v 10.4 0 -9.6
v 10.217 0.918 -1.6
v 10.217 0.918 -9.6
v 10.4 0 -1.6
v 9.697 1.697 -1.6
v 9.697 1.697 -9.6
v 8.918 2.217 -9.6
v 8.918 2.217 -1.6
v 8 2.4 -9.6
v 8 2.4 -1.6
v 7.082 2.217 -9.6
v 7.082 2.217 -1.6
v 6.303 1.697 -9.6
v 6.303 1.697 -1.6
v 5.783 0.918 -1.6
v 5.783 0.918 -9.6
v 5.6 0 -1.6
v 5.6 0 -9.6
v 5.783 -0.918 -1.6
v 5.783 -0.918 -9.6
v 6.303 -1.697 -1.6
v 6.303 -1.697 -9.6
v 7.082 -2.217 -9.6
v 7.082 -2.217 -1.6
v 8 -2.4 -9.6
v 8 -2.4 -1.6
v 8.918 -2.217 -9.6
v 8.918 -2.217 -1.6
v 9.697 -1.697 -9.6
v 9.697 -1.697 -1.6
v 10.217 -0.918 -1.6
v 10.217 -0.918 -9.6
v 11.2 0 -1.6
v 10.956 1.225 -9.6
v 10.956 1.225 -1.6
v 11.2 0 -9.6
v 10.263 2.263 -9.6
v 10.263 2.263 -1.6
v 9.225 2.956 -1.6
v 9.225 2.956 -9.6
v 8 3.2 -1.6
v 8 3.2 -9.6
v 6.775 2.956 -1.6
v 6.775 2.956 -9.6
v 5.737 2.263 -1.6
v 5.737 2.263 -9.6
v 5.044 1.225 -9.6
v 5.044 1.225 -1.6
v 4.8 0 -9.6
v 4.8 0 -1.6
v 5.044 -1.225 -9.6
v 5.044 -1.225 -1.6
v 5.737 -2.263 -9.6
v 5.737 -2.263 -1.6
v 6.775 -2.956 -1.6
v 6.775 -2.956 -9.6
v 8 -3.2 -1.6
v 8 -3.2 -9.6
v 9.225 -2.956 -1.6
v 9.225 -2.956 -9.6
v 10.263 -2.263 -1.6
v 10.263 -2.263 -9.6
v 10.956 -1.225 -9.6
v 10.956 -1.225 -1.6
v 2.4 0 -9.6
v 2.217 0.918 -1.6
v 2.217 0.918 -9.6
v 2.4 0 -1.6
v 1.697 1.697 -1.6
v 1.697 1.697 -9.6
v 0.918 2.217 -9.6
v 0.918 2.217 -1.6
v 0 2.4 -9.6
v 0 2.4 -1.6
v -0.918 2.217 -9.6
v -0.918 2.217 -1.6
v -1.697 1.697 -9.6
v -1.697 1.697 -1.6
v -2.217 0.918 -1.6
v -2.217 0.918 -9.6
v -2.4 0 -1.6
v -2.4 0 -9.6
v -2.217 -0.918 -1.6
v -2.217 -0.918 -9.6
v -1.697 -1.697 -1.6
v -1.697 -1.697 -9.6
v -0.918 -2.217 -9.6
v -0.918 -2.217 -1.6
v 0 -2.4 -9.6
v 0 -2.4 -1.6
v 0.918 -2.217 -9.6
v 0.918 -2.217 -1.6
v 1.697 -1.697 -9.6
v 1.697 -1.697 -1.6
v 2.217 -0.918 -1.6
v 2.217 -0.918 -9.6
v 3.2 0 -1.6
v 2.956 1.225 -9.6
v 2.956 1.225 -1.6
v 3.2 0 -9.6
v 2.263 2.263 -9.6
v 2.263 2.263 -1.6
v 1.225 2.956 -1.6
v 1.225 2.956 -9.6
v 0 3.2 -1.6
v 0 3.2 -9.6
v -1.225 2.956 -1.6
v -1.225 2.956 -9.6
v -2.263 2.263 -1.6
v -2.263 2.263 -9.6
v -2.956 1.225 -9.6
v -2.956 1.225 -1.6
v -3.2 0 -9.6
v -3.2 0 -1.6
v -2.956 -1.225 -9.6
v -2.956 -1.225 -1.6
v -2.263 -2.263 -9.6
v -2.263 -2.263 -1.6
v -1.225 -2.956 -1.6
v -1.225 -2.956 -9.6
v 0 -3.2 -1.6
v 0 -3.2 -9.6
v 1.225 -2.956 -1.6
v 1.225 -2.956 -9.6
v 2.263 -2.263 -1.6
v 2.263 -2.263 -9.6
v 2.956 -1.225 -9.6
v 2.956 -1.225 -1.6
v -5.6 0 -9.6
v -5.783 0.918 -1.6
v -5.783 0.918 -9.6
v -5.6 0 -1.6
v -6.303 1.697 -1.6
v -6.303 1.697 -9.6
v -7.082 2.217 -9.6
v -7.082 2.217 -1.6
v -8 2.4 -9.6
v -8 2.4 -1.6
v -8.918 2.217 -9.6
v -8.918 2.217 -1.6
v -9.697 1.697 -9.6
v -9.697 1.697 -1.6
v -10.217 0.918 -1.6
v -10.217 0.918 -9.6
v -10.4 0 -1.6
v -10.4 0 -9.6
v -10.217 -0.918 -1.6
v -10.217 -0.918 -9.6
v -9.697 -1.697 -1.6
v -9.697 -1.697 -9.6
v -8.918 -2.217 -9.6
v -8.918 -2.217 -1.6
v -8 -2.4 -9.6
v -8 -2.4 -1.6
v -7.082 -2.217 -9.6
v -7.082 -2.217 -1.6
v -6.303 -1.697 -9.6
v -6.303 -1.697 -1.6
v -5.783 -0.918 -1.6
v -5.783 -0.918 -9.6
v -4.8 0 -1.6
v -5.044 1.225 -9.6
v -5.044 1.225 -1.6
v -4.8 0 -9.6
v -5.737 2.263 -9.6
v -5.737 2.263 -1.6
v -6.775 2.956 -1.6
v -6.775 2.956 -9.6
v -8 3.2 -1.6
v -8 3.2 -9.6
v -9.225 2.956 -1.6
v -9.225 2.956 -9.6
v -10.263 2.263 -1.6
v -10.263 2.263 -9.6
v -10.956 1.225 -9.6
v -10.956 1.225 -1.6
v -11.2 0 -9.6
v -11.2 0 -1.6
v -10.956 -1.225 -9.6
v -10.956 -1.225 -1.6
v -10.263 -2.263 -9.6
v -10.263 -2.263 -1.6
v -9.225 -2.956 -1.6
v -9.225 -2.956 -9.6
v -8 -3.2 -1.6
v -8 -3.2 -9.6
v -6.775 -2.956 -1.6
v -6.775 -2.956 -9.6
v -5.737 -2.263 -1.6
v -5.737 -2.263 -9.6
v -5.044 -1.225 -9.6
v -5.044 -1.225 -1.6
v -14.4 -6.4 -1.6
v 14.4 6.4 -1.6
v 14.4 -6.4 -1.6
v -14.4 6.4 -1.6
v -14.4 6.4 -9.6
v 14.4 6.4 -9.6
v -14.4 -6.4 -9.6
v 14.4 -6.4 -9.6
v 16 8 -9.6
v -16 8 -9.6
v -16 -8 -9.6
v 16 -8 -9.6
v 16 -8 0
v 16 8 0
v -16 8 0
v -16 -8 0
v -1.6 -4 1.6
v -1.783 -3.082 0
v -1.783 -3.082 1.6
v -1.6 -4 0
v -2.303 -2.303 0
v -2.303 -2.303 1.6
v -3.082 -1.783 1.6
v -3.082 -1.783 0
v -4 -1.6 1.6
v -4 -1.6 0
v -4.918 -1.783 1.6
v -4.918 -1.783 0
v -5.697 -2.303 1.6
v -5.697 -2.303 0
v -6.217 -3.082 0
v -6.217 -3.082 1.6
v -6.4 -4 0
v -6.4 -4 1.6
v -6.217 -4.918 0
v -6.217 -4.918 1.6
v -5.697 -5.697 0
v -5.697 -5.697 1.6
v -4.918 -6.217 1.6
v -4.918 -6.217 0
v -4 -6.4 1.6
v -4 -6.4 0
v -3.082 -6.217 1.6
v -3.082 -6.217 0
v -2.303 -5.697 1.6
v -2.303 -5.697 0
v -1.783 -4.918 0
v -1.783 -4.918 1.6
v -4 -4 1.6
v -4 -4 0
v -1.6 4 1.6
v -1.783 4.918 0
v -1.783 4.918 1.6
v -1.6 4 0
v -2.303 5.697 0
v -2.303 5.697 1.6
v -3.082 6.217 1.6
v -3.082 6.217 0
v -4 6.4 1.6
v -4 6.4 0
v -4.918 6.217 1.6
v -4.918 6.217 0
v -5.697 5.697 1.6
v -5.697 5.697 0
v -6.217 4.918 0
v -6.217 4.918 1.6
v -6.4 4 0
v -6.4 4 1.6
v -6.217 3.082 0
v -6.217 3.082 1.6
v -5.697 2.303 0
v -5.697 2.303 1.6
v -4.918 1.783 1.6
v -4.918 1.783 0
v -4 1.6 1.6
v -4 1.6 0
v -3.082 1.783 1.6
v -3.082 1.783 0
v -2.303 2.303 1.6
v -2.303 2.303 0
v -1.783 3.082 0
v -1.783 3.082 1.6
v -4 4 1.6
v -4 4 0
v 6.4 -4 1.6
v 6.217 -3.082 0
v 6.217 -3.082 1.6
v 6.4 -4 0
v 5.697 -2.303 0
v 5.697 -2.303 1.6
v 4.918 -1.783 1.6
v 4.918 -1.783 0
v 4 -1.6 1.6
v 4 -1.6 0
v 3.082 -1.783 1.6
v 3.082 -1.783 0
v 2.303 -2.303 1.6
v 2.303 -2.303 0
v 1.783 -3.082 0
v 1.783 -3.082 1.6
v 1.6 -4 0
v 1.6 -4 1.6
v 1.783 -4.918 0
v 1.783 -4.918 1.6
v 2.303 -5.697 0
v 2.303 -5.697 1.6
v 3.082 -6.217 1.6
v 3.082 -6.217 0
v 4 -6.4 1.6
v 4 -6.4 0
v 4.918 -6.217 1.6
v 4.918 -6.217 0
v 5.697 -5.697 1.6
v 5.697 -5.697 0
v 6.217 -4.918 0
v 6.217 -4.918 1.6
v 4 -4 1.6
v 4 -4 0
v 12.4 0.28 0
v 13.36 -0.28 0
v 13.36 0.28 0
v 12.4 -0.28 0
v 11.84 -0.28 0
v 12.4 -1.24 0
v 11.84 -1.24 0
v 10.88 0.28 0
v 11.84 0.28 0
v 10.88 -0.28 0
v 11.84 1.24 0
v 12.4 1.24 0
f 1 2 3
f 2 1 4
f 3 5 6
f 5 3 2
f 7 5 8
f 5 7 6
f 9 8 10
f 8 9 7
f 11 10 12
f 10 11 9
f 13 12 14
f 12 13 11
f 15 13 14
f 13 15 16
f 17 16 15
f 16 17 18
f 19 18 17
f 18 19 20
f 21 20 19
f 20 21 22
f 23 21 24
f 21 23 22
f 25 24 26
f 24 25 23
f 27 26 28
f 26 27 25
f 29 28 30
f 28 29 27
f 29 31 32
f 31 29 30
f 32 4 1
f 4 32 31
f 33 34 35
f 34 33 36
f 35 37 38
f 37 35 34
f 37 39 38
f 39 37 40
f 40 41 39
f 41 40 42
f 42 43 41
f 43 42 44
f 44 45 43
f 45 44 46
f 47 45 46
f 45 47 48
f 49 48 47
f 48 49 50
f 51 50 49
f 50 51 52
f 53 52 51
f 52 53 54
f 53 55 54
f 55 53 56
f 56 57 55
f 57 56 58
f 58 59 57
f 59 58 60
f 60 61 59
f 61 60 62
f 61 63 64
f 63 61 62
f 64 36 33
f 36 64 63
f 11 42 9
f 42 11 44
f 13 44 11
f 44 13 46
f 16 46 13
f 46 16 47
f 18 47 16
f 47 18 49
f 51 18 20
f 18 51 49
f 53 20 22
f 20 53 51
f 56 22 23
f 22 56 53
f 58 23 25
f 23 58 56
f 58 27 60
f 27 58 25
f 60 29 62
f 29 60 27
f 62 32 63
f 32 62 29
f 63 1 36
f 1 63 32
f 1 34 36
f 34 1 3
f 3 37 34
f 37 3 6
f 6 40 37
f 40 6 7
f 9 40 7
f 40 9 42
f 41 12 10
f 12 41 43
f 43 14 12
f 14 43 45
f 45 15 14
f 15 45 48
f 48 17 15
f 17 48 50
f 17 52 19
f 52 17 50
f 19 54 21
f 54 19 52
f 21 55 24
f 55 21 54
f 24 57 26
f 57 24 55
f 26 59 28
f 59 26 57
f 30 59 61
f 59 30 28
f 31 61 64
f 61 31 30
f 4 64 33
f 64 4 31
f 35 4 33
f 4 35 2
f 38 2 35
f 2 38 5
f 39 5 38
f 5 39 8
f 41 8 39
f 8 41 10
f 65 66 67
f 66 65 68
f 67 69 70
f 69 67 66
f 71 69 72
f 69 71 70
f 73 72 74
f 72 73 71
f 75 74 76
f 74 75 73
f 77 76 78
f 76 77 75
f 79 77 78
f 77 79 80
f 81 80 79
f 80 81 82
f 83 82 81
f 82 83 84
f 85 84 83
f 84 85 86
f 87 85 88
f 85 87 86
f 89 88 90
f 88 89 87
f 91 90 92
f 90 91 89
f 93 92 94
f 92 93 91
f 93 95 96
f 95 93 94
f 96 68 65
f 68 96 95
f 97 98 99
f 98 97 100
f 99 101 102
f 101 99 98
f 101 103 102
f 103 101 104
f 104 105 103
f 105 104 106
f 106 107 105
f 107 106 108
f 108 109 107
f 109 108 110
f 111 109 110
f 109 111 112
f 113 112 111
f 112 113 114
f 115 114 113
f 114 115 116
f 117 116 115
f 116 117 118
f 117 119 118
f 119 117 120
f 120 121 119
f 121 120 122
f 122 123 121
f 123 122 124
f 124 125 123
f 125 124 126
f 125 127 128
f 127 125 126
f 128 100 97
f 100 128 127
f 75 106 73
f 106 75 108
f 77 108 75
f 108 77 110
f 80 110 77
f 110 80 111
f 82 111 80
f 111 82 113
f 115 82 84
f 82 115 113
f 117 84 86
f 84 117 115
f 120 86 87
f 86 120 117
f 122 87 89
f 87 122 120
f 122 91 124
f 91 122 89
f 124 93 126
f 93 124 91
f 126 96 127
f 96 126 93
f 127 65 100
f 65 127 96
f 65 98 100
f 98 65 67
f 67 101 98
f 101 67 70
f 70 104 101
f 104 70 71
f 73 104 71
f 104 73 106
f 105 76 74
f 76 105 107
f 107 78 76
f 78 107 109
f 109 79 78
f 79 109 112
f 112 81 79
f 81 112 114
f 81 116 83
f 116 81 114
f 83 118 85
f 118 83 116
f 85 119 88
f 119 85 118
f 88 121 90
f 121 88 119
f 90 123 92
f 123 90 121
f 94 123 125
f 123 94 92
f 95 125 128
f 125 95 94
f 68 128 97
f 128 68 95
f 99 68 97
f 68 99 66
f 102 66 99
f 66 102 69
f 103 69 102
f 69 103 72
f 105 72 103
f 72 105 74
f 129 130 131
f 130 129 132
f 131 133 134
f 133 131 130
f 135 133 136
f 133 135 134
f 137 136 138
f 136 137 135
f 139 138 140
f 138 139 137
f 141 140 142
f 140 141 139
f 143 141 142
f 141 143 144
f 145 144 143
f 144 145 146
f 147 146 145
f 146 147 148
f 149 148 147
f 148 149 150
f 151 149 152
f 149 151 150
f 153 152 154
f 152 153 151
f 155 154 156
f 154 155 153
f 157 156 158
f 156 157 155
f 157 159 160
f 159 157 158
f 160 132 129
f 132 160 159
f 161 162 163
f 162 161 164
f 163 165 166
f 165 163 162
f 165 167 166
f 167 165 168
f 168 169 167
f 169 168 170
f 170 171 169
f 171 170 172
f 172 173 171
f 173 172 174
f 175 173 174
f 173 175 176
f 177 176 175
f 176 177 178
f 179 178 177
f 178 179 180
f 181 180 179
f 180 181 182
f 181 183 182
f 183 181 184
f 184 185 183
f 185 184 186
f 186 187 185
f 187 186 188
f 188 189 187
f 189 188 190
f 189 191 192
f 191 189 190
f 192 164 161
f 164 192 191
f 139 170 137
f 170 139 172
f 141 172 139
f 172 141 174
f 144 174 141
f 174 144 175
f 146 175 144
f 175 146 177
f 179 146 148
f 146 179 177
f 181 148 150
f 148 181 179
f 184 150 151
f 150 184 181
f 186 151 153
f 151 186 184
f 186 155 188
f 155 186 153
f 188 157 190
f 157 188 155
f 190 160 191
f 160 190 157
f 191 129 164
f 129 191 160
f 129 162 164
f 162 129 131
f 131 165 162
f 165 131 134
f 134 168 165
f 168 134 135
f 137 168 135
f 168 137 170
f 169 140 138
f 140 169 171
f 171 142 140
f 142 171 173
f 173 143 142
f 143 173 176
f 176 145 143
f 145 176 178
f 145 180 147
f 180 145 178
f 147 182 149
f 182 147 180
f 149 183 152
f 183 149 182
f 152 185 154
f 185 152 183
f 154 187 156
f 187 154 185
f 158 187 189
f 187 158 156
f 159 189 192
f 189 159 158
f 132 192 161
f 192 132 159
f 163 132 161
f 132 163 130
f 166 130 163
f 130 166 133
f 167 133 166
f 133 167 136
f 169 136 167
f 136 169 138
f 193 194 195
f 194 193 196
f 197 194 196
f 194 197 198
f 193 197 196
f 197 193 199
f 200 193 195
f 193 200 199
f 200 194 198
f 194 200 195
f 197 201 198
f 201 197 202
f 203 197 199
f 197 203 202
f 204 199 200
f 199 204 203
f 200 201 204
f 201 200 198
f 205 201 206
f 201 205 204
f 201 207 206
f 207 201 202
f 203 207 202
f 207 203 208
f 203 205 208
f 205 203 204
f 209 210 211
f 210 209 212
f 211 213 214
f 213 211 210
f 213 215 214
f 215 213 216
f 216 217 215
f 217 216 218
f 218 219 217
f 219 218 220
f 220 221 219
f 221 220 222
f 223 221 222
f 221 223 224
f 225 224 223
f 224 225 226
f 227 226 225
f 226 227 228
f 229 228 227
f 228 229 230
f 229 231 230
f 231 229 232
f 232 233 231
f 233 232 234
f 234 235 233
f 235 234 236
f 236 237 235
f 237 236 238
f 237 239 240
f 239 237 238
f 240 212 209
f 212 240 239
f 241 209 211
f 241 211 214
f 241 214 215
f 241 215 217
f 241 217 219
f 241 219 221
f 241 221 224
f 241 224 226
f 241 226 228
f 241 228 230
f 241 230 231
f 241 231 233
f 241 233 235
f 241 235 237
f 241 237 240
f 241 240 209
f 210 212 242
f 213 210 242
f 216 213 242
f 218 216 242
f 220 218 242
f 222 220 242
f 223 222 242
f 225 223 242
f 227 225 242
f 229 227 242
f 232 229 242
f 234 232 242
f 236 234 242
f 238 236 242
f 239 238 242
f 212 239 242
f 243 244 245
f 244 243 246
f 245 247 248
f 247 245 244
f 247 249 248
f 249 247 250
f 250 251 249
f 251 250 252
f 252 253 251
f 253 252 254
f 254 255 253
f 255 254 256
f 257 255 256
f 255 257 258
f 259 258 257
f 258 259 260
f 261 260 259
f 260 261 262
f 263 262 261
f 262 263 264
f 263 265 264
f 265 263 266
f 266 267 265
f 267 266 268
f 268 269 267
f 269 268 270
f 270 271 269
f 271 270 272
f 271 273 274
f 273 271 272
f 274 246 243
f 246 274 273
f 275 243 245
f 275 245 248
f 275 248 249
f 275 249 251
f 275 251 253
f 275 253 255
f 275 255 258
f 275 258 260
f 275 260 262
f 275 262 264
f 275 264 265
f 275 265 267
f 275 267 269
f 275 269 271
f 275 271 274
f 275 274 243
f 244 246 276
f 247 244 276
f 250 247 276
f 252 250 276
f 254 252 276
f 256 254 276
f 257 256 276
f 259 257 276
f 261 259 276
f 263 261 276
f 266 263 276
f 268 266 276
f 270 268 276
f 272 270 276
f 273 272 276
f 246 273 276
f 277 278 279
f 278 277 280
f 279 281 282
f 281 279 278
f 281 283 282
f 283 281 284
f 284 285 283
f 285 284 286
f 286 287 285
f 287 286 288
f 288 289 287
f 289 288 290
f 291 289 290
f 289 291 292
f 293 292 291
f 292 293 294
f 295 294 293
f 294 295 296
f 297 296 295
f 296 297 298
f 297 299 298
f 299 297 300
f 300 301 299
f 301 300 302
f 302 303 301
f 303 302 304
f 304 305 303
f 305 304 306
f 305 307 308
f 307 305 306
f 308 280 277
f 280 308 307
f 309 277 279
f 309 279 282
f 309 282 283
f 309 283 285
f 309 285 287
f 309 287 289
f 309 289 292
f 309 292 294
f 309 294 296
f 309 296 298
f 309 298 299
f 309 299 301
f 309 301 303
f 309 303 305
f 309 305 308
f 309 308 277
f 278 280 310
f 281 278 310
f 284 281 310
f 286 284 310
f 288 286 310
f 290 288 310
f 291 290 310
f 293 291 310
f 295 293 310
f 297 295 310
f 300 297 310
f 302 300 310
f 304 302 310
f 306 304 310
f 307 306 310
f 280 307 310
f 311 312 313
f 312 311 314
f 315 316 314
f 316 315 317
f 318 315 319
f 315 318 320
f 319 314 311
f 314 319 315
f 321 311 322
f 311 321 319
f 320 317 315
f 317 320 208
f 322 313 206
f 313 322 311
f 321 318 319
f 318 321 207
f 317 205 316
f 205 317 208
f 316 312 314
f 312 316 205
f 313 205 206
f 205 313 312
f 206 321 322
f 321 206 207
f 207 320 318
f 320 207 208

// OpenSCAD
// file: ../p/4-4ring3.scad
use <../lib.scad>
$fa=1; $fs=0.2;
function ldraw_lib__4_4ring3(realsolid=false) = [
// 0 Ring  3 x 1.0
// 0 Name: 4-4ring3.dat
// 0 Author: James Jessiman
// 0 !LDRAW_ORG Primitive UPDATE 2009-01
// 0 !LICENSE Licensed under CC BY 2.0 and CC BY 4.0 : see CAreadme.txt
// 
// 0 BFC CERTIFY CCW
  [0,"BFC","CERTIFY"],
  [0,"BFC","CCW"],
// 
// 0 !HISTORY 1998-12-15 [PTadmin] Official Update 1998-10
// 0 !HISTORY 2002-04-05 [hafhead] Added BFC statement
// 0 !HISTORY 2002-04-25 [PTadmin] Official Update 2002-02
// 0 !HISTORY 2007-06-24 [PTadmin] Header formatted for Contributor Agreement
// 0 !HISTORY 2008-07-01 [PTadmin] Official Update 2008-01
// 0 !HISTORY 2008-08-26 [cwdee] Switch polygon winding and rename
// 0 !HISTORY 2009-05-02 [PTadmin] Official Update 2009-01
// 
// 
// 4 16 -1.5308 0 3.6956 -1.1481 0 2.7717 0 0 3 0 0 4
  [4,16,-1.5308,0,3.6956,-1.1481,0,2.7717,0,0,3,0,0,4],
// 4 16 -2.8284 0 2.8284 -2.1213 0 2.1213 -1.1481 0 2.7717 -1.5308 0 3.6956
  [4,16,-2.8284,0,2.8284,-2.1213,0,2.1213,-1.1481,0,2.7717,-1.5308,0,3.6956],
// 4 16 -3.6956 0 1.5308 -2.7717 0 1.1481 -2.1213 0 2.1213 -2.8284 0 2.8284
  [4,16,-3.6956,0,1.5308,-2.7717,0,1.1481,-2.1213,0,2.1213,-2.8284,0,2.8284],
// 4 16 -4 0 0 -3 0 0 -2.7717 0 1.1481 -3.6956 0 1.5308
  [4,16,-4,0,0,-3,0,0,-2.7717,0,1.1481,-3.6956,0,1.5308],
// 4 16 -3.6956 0 -1.5308 -2.7717 0 -1.1481 -3 0 0 -4 0 0
  [4,16,-3.6956,0,-1.5308,-2.7717,0,-1.1481,-3,0,0,-4,0,0],
// 4 16 -2.8284 0 -2.8284 -2.1213 0 -2.1213 -2.7717 0 -1.1481 -3.6956 0 -1.5308
  [4,16,-2.8284,0,-2.8284,-2.1213,0,-2.1213,-2.7717,0,-1.1481,-3.6956,0,-1.5308],
// 4 16 -1.5308 0 -3.6956 -1.1481 0 -2.7717 -2.1213 0 -2.1213 -2.8284 0 -2.8284
  [4,16,-1.5308,0,-3.6956,-1.1481,0,-2.7717,-2.1213,0,-2.1213,-2.8284,0,-2.8284],
// 4 16 0 0 -4 0 0 -3 -1.1481 0 -2.7717 -1.5308 0 -3.6956
  [4,16,0,0,-4,0,0,-3,-1.1481,0,-2.7717,-1.5308,0,-3.6956],
// 4 16 1.5308 0 -3.6956 1.1481 0 -2.7717 0 0 -3 0 0 -4
  [4,16,1.5308,0,-3.6956,1.1481,0,-2.7717,0,0,-3,0,0,-4],
// 4 16 2.8284 0 -2.8284 2.1213 0 -2.1213 1.1481 0 -2.7717 1.5308 0 -3.6956
  [4,16,2.8284,0,-2.8284,2.1213,0,-2.1213,1.1481,0,-2.7717,1.5308,0,-3.6956],
// 4 16 3.6956 0 -1.5308 2.7717 0 -1.1481 2.1213 0 -2.1213 2.8284 0 -2.8284
  [4,16,3.6956,0,-1.5308,2.7717,0,-1.1481,2.1213,0,-2.1213,2.8284,0,-2.8284],
// 4 16 4 0 0 3 0 0 2.7717 0 -1.1481 3.6956 0 -1.5308
  [4,16,4,0,0,3,0,0,2.7717,0,-1.1481,3.6956,0,-1.5308],
// 4 16 3.6956 0 1.5308 2.7717 0 1.1481 3 0 0 4 0 0
  [4,16,3.6956,0,1.5308,2.7717,0,1.1481,3,0,0,4,0,0],
// 4 16 2.8284 0 2.8284 2.1213 0 2.1213 2.7717 0 1.1481 3.6956 0 1.5308
  [4,16,2.8284,0,2.8284,2.1213,0,2.1213,2.7717,0,1.1481,3.6956,0,1.5308],
// 4 16 1.5308 0 3.6956 1.1481 0 2.7717 2.1213 0 2.1213 2.8284 0 2.8284
  [4,16,1.5308,0,3.6956,1.1481,0,2.7717,2.1213,0,2.1213,2.8284,0,2.8284],
// 4 16 0 0 4 0 0 3 1.1481 0 2.7717 1.5308 0 3.6956
  [4,16,0,0,4,0,0,3,1.1481,0,2.7717,1.5308,0,3.6956],
// 0
];
module ldraw_lib__4_4ring3(step=0, col=false, unit=2/5, alt=false, line=0.2, solid=!$preview)
    makepoly(ldraw_lib__4_4ring3(solid), step=step, col=col, unit=unit, alt=alt, line=line, solid=solid);
ldraw_lib__4_4ring3(line=0.2);
// file: ../p/4-4edge.scad
use <../lib.scad>
function ldraw_lib__4_4edge() = [
// 0 Circle 1.0
// 0 Name: 4-4edge.dat
// 0 Author: James Jessiman
// 0 !LDRAW_ORG Primitive UPDATE 2017-01
// 0 !LICENSE Licensed under CC BY 2.0 and CC BY 4.0 : see CAreadme.txt
// 
// 0 BFC CERTIFY CCW
  [0,"BFC","CERTIFY"],
  [0,"BFC","CCW"],
// 
// 0 !HISTORY 1998-12-15 [PTadmin] Official Update 1998-10
// 0 !HISTORY 2005-12-28 [PTadmin] Official Update 2005-01
// 0 !HISTORY 2007-06-24 [PTadmin] Header formatted for Contributor Agreement
// 0 !HISTORY 2008-07-01 [PTadmin] Official Update 2008-01
// 0 !HISTORY 2017-01-15 [Steffen] BFCed
// 0 !HISTORY 2017-12-30 [PTadmin] Official Update 2017-01
// 
// 
// 2 24 1 0 0 0.9239 0 0.3827
  [2,24,1,0,0,0.9239,0,0.3827],
// 2 24 0.9239 0 0.3827 0.7071 0 0.7071
  [2,24,0.9239,0,0.3827,0.7071,0,0.7071],
// 2 24 0.7071 0 0.7071 0.3827 0 0.9239
  [2,24,0.7071,0,0.7071,0.3827,0,0.9239],
// 2 24 0.3827 0 0.9239 0 0 1
  [2,24,0.3827,0,0.9239,0,0,1],
// 2 24 0 0 1 -0.3827 0 0.9239
  [2,24,0,0,1,-0.3827,0,0.9239],
// 2 24 -0.3827 0 0.9239 -0.7071 0 0.7071
  [2,24,-0.3827,0,0.9239,-0.7071,0,0.7071],
// 2 24 -0.7071 0 0.7071 -0.9239 0 0.3827
  [2,24,-0.7071,0,0.7071,-0.9239,0,0.3827],
// 2 24 -0.9239 0 0.3827 -1 0 -0
  [2,24,-0.9239,0,0.3827,-1,0,-0],
// 2 24 -1 0 -0 -0.9239 0 -0.3827
  [2,24,-1,0,-0,-0.9239,0,-0.3827],
// 2 24 -0.9239 0 -0.3827 -0.7071 0 -0.7071
  [2,24,-0.9239,0,-0.3827,-0.7071,0,-0.7071],
// 2 24 -0.7071 0 -0.7071 -0.3827 0 -0.9239
  [2,24,-0.7071,0,-0.7071,-0.3827,0,-0.9239],
// 2 24 -0.3827 0 -0.9239 0 0 -1
  [2,24,-0.3827,0,-0.9239,0,0,-1],
// 2 24 0 0 -1 0.3827 0 -0.9239
  [2,24,0,0,-1,0.3827,0,-0.9239],
// 2 24 0.3827 0 -0.9239 0.7071 0 -0.7071
  [2,24,0.3827,0,-0.9239,0.7071,0,-0.7071],
// 2 24 0.7071 0 -0.7071 0.9239 0 -0.3827
  [2,24,0.7071,0,-0.7071,0.9239,0,-0.3827],
// 2 24 0.9239 0 -0.3827 1 0 0
  [2,24,0.9239,0,-0.3827,1,0,0],
];
module ldraw_lib__4_4edge(step=0, col=false, unit=2/5, alt=false, line=0.2, solid=!$preview)
    makepoly(ldraw_lib__4_4edge(), step=step, col=col, unit=unit, alt=alt, line=line, solid=solid);
ldraw_lib__4_4edge(line=0.2);
// file: ../p/4-4disc.scad
use <../lib.scad>
function ldraw_lib__4_4disc() = [
// 0 Disc 1.0
// 0 Name: 4-4disc.dat
// 0 Author: James Jessiman
// 0 !LDRAW_ORG Primitive UPDATE 2002-02
// 0 !LICENSE Licensed under CC BY 2.0 and CC BY 4.0 : see CAreadme.txt
// 
// 0 BFC CERTIFY CCW
  [0,"BFC","CERTIFY"],
  [0,"BFC","CCW"],
// 
// 0 !HISTORY 1998-12-15 [PTadmin] Official Update 1998-10
// 0 !HISTORY 2002-03-23 [sbliss] Added BFC statement
// 0 !HISTORY 2002-04-25 [PTadmin] Official Update 2002-02
// 0 !HISTORY 2007-06-24 [PTadmin] Header formatted for Contributor Agreement
// 0 !HISTORY 2008-07-01 [PTadmin] Official Update 2008-01
// 
// 
// 3 16 0 0 0 1 0 0 0.9239 0 0.3827
  [3,16,0,0,0,1,0,0,0.9239,0,0.3827],
// 3 16 0 0 0 0.9239 0 0.3827 0.7071 0 0.7071
  [3,16,0,0,0,0.9239,0,0.3827,0.7071,0,0.7071],
// 3 16 0 0 0 0.7071 0 0.7071 0.3827 0 0.9239
  [3,16,0,0,0,0.7071,0,0.7071,0.3827,0,0.9239],
// 3 16 0 0 0 0.3827 0 0.9239 0 0 1
  [3,16,0,0,0,0.3827,0,0.9239,0,0,1],
// 3 16 0 0 0 0 0 1 -0.3827 0 0.9239
  [3,16,0,0,0,0,0,1,-0.3827,0,0.9239],
// 3 16 0 0 0 -0.3827 0 0.9239 -0.7071 0 0.7071
  [3,16,0,0,0,-0.3827,0,0.9239,-0.7071,0,0.7071],
// 3 16 0 0 0 -0.7071 0 0.7071 -0.9239 0 0.3827
  [3,16,0,0,0,-0.7071,0,0.7071,-0.9239,0,0.3827],
// 3 16 0 0 0 -0.9239 0 0.3827 -1 0 -0
  [3,16,0,0,0,-0.9239,0,0.3827,-1,0,-0],
// 3 16 0 0 0 -1 0 -0 -0.9239 0 -0.3827
  [3,16,0,0,0,-1,0,-0,-0.9239,0,-0.3827],
// 3 16 0 0 0 -0.9239 0 -0.3827 -0.7071 0 -0.7071
  [3,16,0,0,0,-0.9239,0,-0.3827,-0.7071,0,-0.7071],
// 3 16 0 0 0 -0.7071 0 -0.7071 -0.3827 0 -0.9239
  [3,16,0,0,0,-0.7071,0,-0.7071,-0.3827,0,-0.9239],
// 3 16 0 0 0 -0.3827 0 -0.9239 0 0 -1
  [3,16,0,0,0,-0.3827,0,-0.9239,0,0,-1],
// 3 16 0 0 0 0 0 -1 0.3827 0 -0.9239
  [3,16,0,0,0,0,0,-1,0.3827,0,-0.9239],
// 3 16 0 0 0 0.3827 0 -0.9239 0.7071 0 -0.7071
  [3,16,0,0,0,0.3827,0,-0.9239,0.7071,0,-0.7071],
// 3 16 0 0 0 0.7071 0 -0.7071 0.9239 0 -0.3827
  [3,16,0,0,0,0.7071,0,-0.7071,0.9239,0,-0.3827],
// 3 16 0 0 0 0.9239 0 -0.3827 1 0 0
  [3,16,0,0,0,0.9239,0,-0.3827,1,0,0],
// 0
];
module ldraw_lib__4_4disc(step=0, col=false, unit=2/5, alt=false, line=0.2, solid=!$preview)
    makepoly(ldraw_lib__4_4disc(), step=step, col=col, unit=unit, alt=alt, line=line, solid=solid);
ldraw_lib__4_4disc(line=0.2);
// file: ../p/4-4cyli.scad
use <../lib.scad>
$fa=1; $fs=0.2;
function ldraw_lib__4_4cyli(realsolid=false) = [
// 0 Cylinder 1.0
// 0 Name: 4-4cyli.dat
// 0 Author: James Jessiman
// 0 !LDRAW_ORG Primitive UPDATE 2005-01
// 0 !LICENSE Licensed under CC BY 2.0 and CC BY 4.0 : see CAreadme.txt
// 
// 0 BFC CERTIFY CCW
  [0,"BFC","CERTIFY"],
  [0,"BFC","CCW"],
// 
// 0 !HISTORY 1998-12-15 [PTadmin] Official Update 1998-10
// 0 !HISTORY 2002-03-23 [sbliss] Added BFC statement; merged headers from files in distributions LDraw 0.27 and Complete.
// 0 !HISTORY 2002-04-25 [PTadmin] Official Update 2002-02
// 0 !HISTORY 2004-12-14 [guyvivan] BFC CCW
// 0 !HISTORY 2005-12-28 [PTadmin] Official Update 2005-01
// 0 !HISTORY 2007-06-24 [PTadmin] Header formatted for Contributor Agreement
// 0 !HISTORY 2008-07-01 [PTadmin] Official Update 2008-01
// 
// 
// 4 16 1 1 0 0.9239 1 0.3827 0.9239 0 0.3827 1 0 0
  [4,16,1,1,0,0.9239,1,0.3827,0.9239,0,0.3827,1,0,0],
// 5 24 1 0 0 1 1 0 0.9239 0 0.3827 0.9239 0 -0.3827
  [5,24,1,0,0,1,1,0,0.9239,0,0.3827,0.9239,0,-0.3827],
// 4 16 0.9239 1 0.3827 0.7071 1 0.7071 0.7071 0 0.7071 0.9239 0 0.3827
  [4,16,0.9239,1,0.3827,0.7071,1,0.7071,0.7071,0,0.7071,0.9239,0,0.3827],
// 5 24 0.9239 0 0.3827 0.9239 1 0.3827 0.7071 0 0.7071 1 0 0
  [5,24,0.9239,0,0.3827,0.9239,1,0.3827,0.7071,0,0.7071,1,0,0],
// 4 16 0.7071 1 0.7071 0.3827 1 0.9239 0.3827 0 0.9239 0.7071 0 0.7071
  [4,16,0.7071,1,0.7071,0.3827,1,0.9239,0.3827,0,0.9239,0.7071,0,0.7071],
// 5 24 0.7071 0 0.7071 0.7071 1 0.7071 0.3827 0 0.9239 0.9239 0 0.3827
  [5,24,0.7071,0,0.7071,0.7071,1,0.7071,0.3827,0,0.9239,0.9239,0,0.3827],
// 4 16 0.3827 1 0.9239 0 1 1 0 0 1 0.3827 0 0.9239
  [4,16,0.3827,1,0.9239,0,1,1,0,0,1,0.3827,0,0.9239],
// 5 24 0.3827 0 0.9239 0.3827 1 0.9239 0 0 1 0.7071 0 0.7071
  [5,24,0.3827,0,0.9239,0.3827,1,0.9239,0,0,1,0.7071,0,0.7071],
// 4 16 0 1 1 -0.3827 1 0.9239 -0.3827 0 0.9239 0 0 1
  [4,16,0,1,1,-0.3827,1,0.9239,-0.3827,0,0.9239,0,0,1],
// 5 24 0 0 1 0 1 1 -0.3827 0 0.9239 0.3827 0 0.9239
  [5,24,0,0,1,0,1,1,-0.3827,0,0.9239,0.3827,0,0.9239],
// 4 16 -0.3827 1 0.9239 -0.7071 1 0.7071 -0.7071 0 0.7071 -0.3827 0 0.9239
  [4,16,-0.3827,1,0.9239,-0.7071,1,0.7071,-0.7071,0,0.7071,-0.3827,0,0.9239],
// 5 24 -0.3827 0 0.9239 -0.3827 1 0.9239 -0.7071 0 0.7071 0 0 1
  [5,24,-0.3827,0,0.9239,-0.3827,1,0.9239,-0.7071,0,0.7071,0,0,1],
// 4 16 -0.7071 1 0.7071 -0.9239 1 0.3827 -0.9239 0 0.3827 -0.7071 0 0.7071
  [4,16,-0.7071,1,0.7071,-0.9239,1,0.3827,-0.9239,0,0.3827,-0.7071,0,0.7071],
// 5 24 -0.7071 0 0.7071 -0.7071 1 0.7071 -0.9239 0 0.3827 -0.3827 0 0.9239
  [5,24,-0.7071,0,0.7071,-0.7071,1,0.7071,-0.9239,0,0.3827,-0.3827,0,0.9239],
// 4 16 -0.9239 1 0.3827 -1 1 0 -1 0 0 -0.9239 0 0.3827
  [4,16,-0.9239,1,0.3827,-1,1,0,-1,0,0,-0.9239,0,0.3827],
// 5 24 -0.9239 0 0.3827 -0.9239 1 0.3827 -1 0 0 -0.7071 0 0.7071
  [5,24,-0.9239,0,0.3827,-0.9239,1,0.3827,-1,0,0,-0.7071,0,0.7071],
// 4 16 -1 1 0 -0.9239 1 -0.3827 -0.9239 0 -0.3827 -1 0 0
  [4,16,-1,1,0,-0.9239,1,-0.3827,-0.9239,0,-0.3827,-1,0,0],
// 5 24 -1 0 0 -1 1 0 -0.9239 0 -0.3827 -0.9239 0 0.3827
  [5,24,-1,0,0,-1,1,0,-0.9239,0,-0.3827,-0.9239,0,0.3827],
// 4 16 -0.9239 1 -0.3827 -0.7071 1 -0.7071 -0.7071 0 -0.7071 -0.9239 0 -0.3827
  [4,16,-0.9239,1,-0.3827,-0.7071,1,-0.7071,-0.7071,0,-0.7071,-0.9239,0,-0.3827],
// 5 24 -0.9239 0 -0.3827 -0.9239 1 -0.3827 -0.7071 0 -0.7071 -1 0 0
  [5,24,-0.9239,0,-0.3827,-0.9239,1,-0.3827,-0.7071,0,-0.7071,-1,0,0],
// 4 16 -0.7071 1 -0.7071 -0.3827 1 -0.9239 -0.3827 0 -0.9239 -0.7071 0 -0.7071
  [4,16,-0.7071,1,-0.7071,-0.3827,1,-0.9239,-0.3827,0,-0.9239,-0.7071,0,-0.7071],
// 5 24 -0.7071 0 -0.7071 -0.7071 1 -0.7071 -0.3827 0 -0.9239 -0.9239 0 -0.3827
  [5,24,-0.7071,0,-0.7071,-0.7071,1,-0.7071,-0.3827,0,-0.9239,-0.9239,0,-0.3827],
// 4 16 -0.3827 1 -0.9239 0 1 -1 0 0 -1 -0.3827 0 -0.9239
  [4,16,-0.3827,1,-0.9239,0,1,-1,0,0,-1,-0.3827,0,-0.9239],
// 5 24 -0.3827 0 -0.9239 -0.3827 1 -0.9239 0 0 -1 -0.7071 0 -0.7071
  [5,24,-0.3827,0,-0.9239,-0.3827,1,-0.9239,0,0,-1,-0.7071,0,-0.7071],
// 4 16 0 1 -1 0.3827 1 -0.9239 0.3827 0 -0.9239 0 0 -1
  [4,16,0,1,-1,0.3827,1,-0.9239,0.3827,0,-0.9239,0,0,-1],
// 5 24 0 0 -1 0 1 -1 0.3827 0 -0.9239 -0.3827 0 -0.9239
  [5,24,0,0,-1,0,1,-1,0.3827,0,-0.9239,-0.3827,0,-0.9239],
// 4 16 0.3827 1 -0.9239 0.7071 1 -0.7071 0.7071 0 -0.7071 0.3827 0 -0.9239
  [4,16,0.3827,1,-0.9239,0.7071,1,-0.7071,0.7071,0,-0.7071,0.3827,0,-0.9239],
// 5 24 0.3827 0 -0.9239 0.3827 1 -0.9239 0.7071 0 -0.7071 0 0 -1
  [5,24,0.3827,0,-0.9239,0.3827,1,-0.9239,0.7071,0,-0.7071,0,0,-1],
// 4 16 0.7071 1 -0.7071 0.9239 1 -0.3827 0.9239 0 -0.3827 0.7071 0 -0.7071
  [4,16,0.7071,1,-0.7071,0.9239,1,-0.3827,0.9239,0,-0.3827,0.7071,0,-0.7071],
// 5 24 0.7071 0 -0.7071 0.7071 1 -0.7071 0.9239 0 -0.3827 0.3827 0 -0.9239
  [5,24,0.7071,0,-0.7071,0.7071,1,-0.7071,0.9239,0,-0.3827,0.3827,0,-0.9239],
// 4 16 0.9239 1 -0.3827 1 1 0 1 0 0 0.9239 0 -0.3827
  [4,16,0.9239,1,-0.3827,1,1,0,1,0,0,0.9239,0,-0.3827],
// 5 24 0.9239 0 -0.3827 0.9239 1 -0.3827 1 0 0 0.7071 0 -0.7071
  [5,24,0.9239,0,-0.3827,0.9239,1,-0.3827,1,0,0,0.7071,0,-0.7071],
// 0
];
module ldraw_lib__4_4cyli(step=0, col=false, unit=2/5, alt=false, line=0.2, solid=!$preview)
    makepoly(ldraw_lib__4_4cyli(solid), step=step, col=col, unit=unit, alt=alt, line=line, solid=solid);
ldraw_lib__4_4cyli(line=0.2);
// file: ../p/stud4.scad
use <../lib.scad>
use <4-4cyli.scad>
use <4-4edge.scad>
use <4-4ring3.scad>
function ldraw_lib__stud4() = [
// 0 Stud Tube Open
// 0 Name: stud4.dat
// 0 Author: James Jessiman
// 0 !LDRAW_ORG Primitive UPDATE 2009-02
// 0 !LICENSE Licensed under CC BY 4.0 : see CAreadme.txt
// 
// 0 BFC CERTIFY CCW
  [0,"BFC","CERTIFY"],
  [0,"BFC","CCW"],
// 
// 0 !HISTORY 1999-07-05 [PTadmin] Official Update 1999-05
// 0 !HISTORY 2002-04-04 [sbliss] Modified for BFC compliance
// 0 !HISTORY 2002-04-25 [PTadmin] Official Update 2002-02
// 0 !HISTORY 2007-06-24 [PTadmin] Header formatted for Contributor Agreement
// 0 !HISTORY 2008-07-01 [PTadmin] Official Update 2008-01
// 0 !HISTORY 2009-06-21 [cwdee] Update ring references to 4-4ring
// 0 !HISTORY 2009-09-03 [PTadmin] Official Update 2009-02
// 
// 
// 1 16 0 -4 0 6 0 0 0 1 0 0 0 6 4-4edge.dat
  [1,16,0,-4,0,6,0,0,0,1,0,0,0,6, ldraw_lib__4_4edge()],
// 1 16 0 -4 0 8 0 0 0 1 0 0 0 8 4-4edge.dat
  [1,16,0,-4,0,8,0,0,0,1,0,0,0,8, ldraw_lib__4_4edge()],
// 1 16 0 0 0 6 0 0 0 1 0 0 0 6 4-4edge.dat
  [1,16,0,0,0,6,0,0,0,1,0,0,0,6, ldraw_lib__4_4edge()],
// 1 16 0 0 0 8 0 0 0 1 0 0 0 8 4-4edge.dat
  [1,16,0,0,0,8,0,0,0,1,0,0,0,8, ldraw_lib__4_4edge()],
// 0 BFC INVERTNEXT
  [0,"BFC","INVERTNEXT"],
// 1 16 0 -4 0 6 0 0 0 4 0 0 0 6 4-4cyli.dat
  [1,16,0,-4,0,6,0,0,0,4,0,0,0,6, ldraw_lib__4_4cyli()],
// 1 16 0 -4 0 8 0 0 0 4 0 0 0 8 4-4cyli.dat
  [1,16,0,-4,0,8,0,0,0,4,0,0,0,8, ldraw_lib__4_4cyli()],
// 1 16 0 -4 0 2 0 0 0 1 0 0 0 2 4-4ring3.dat
  [1,16,0,-4,0,2,0,0,0,1,0,0,0,2, ldraw_lib__4_4ring3()],
  [-1,16,0,0,0,2,0,0,0,-1,0,0,0,2, ldraw_lib__4_4ring3()],
// 0
];
module ldraw_lib__stud4(step=0, col=false, unit=2/5, alt=false, line=0.2, solid=!$preview)
    makepoly(ldraw_lib__stud4(), step=step, col=col, unit=unit, alt=alt, line=line, solid=solid);
ldraw_lib__stud4(line=0.2);
// file: ../p/box5.scad
use <../lib.scad>
function ldraw_lib__box5() = [
// 0 Box with 5 Faces and All Edges
// 0 Name: box5.dat
// 0 Author: James Jessiman
// 0 !LDRAW_ORG Primitive UPDATE 2012-01
// 0 !LICENSE Licensed under CC BY 2.0 and CC BY 4.0 : see CAreadme.txt
// 
// 0 BFC CERTIFY CCW
  [0,"BFC","CERTIFY"],
  [0,"BFC","CCW"],
// 
// 0 !HISTORY 2002-04-03 [sbliss] Modified for BFC compliance
// 0 !HISTORY 2002-04-25 [PTadmin] Official Update 2002-02
// 0 !HISTORY 2007-06-24 [PTadmin] Header formatted for Contributor Agreement
// 0 !HISTORY 2008-07-01 [PTadmin] Official Update 2008-01
// 0 !HISTORY 2012-02-16 [Philo] Changed to CCW
// 0 !HISTORY 2012-03-30 [PTadmin] Official Update 2012-01
// 
// 
// 2 24 1 1 1 -1 1 1
  [2,24,1,1,1,-1,1,1],
// 2 24 -1 1 1 -1 1 -1
  [2,24,-1,1,1,-1,1,-1],
// 2 24 -1 1 -1 1 1 -1
  [2,24,-1,1,-1,1,1,-1],
// 2 24 1 1 -1 1 1 1
  [2,24,1,1,-1,1,1,1],
// 2 24 1 0 1 -1 0 1
  [2,24,1,0,1,-1,0,1],
// 2 24 -1 0 1 -1 0 -1
  [2,24,-1,0,1,-1,0,-1],
// 2 24 -1 0 -1 1 0 -1
  [2,24,-1,0,-1,1,0,-1],
// 2 24 1 0 -1 1 0 1
  [2,24,1,0,-1,1,0,1],
// 2 24 1 0 1 1 1 1
  [2,24,1,0,1,1,1,1],
// 2 24 -1 0 1 -1 1 1
  [2,24,-1,0,1,-1,1,1],
// 2 24 1 0 -1 1 1 -1
  [2,24,1,0,-1,1,1,-1],
// 2 24 -1 0 -1 -1 1 -1
  [2,24,-1,0,-1,-1,1,-1],
// 4 16 -1 1 1 1 1 1 1 1 -1 -1 1 -1
  [4,16,-1,1,1,1,1,1,1,1,-1,-1,1,-1],
// 4 16 -1 1 1 -1 0 1 1 0 1 1 1 1
  [4,16,-1,1,1,-1,0,1,1,0,1,1,1,1],
// 4 16 -1 1 -1 -1 0 -1 -1 0 1 -1 1 1
  [4,16,-1,1,-1,-1,0,-1,-1,0,1,-1,1,1],
// 4 16 1 1 -1 1 0 -1 -1 0 -1 -1 1 -1
  [4,16,1,1,-1,1,0,-1,-1,0,-1,-1,1,-1],
// 4 16 1 1 1 1 0 1 1 0 -1 1 1 -1
  [4,16,1,1,1,1,0,1,1,0,-1,1,1,-1],
];
makepoly(ldraw_lib__box5(), line=0.2);
// file: ../p/box4.scad
use <../lib.scad>
function ldraw_lib__box4() = [
// 0 Box with 4 Faces (2 Parallel Pairs) and All Edges
// 0 Name: box4.dat
// 0 Author: James Jessiman
// 0 !LDRAW_ORG Primitive UPDATE 2012-01
// 0 !LICENSE Licensed under CC BY 4.0 : see CAreadme.txt
// 
// 0 BFC CERTIFY CCW
  [0,"BFC","CERTIFY"],
  [0,"BFC","CCW"],
// 
// 0 !HISTORY 2002-04-03 [sbliss] Modified for BFC compliance
// 0 !HISTORY 2002-04-25 [PTadmin] Official Update 2002-02
// 0 !HISTORY 2007-06-24 [PTadmin] Header formatted for Contributor Agreement
// 0 !HISTORY 2008-07-01 [PTadmin] Official Update 2008-01
// 0 !HISTORY 2012-02-16 [Philo] Changed to CCW
// 0 !HISTORY 2012-03-30 [PTadmin] Official Update 2012-01
// 
// 
// 2 24 1 1 1 -1 1 1
  [2,24,1,1,1,-1,1,1],
// 2 24 -1 1 1 -1 1 -1
  [2,24,-1,1,1,-1,1,-1],
// 2 24 -1 1 -1 1 1 -1
  [2,24,-1,1,-1,1,1,-1],
// 2 24 1 1 -1 1 1 1
  [2,24,1,1,-1,1,1,1],
// 2 24 1 0 1 -1 0 1
  [2,24,1,0,1,-1,0,1],
// 2 24 -1 0 1 -1 0 -1
  [2,24,-1,0,1,-1,0,-1],
// 2 24 -1 0 -1 1 0 -1
  [2,24,-1,0,-1,1,0,-1],
// 2 24 1 0 -1 1 0 1
  [2,24,1,0,-1,1,0,1],
// 2 24 1 0 1 1 1 1
  [2,24,1,0,1,1,1,1],
// 2 24 -1 0 1 -1 1 1
  [2,24,-1,0,1,-1,1,1],
// 2 24 1 0 -1 1 1 -1
  [2,24,1,0,-1,1,1,-1],
// 2 24 -1 0 -1 -1 1 -1
  [2,24,-1,0,-1,-1,1,-1],
// 4 16 -1 1 1 -1 0 1 1 0 1 1 1 1
  [4,16,-1,1,1,-1,0,1,1,0,1,1,1,1],
// 4 16 -1 1 -1 -1 0 -1 -1 0 1 -1 1 1
  [4,16,-1,1,-1,-1,0,-1,-1,0,1,-1,1,1],
// 4 16 1 1 -1 1 0 -1 -1 0 -1 -1 1 -1
  [4,16,1,1,-1,1,0,-1,-1,0,-1,-1,1,-1],
// 4 16 1 1 1 1 0 1 1 0 -1 1 1 -1
  [4,16,1,1,1,1,0,1,1,0,-1,1,1,-1],
];
module ldraw_lib__box4(step=0, col=false, unit=2/5, alt=false, line=0.2, solid=!$preview)
    makepoly(ldraw_lib__box4(), step=step, col=col, unit=unit, alt=alt, line=line, solid=solid);
ldraw_lib__box4(line=0.2);
// file: ../p/stud.scad
use <../lib.scad>
use <4-4cyli.scad>
use <4-4disc.scad>
use <4-4edge.scad>
function ldraw_lib__stud() = [
// 0 Stud
// 0 Name: stud.dat
// 0 Author: James Jessiman
// 0 !LDRAW_ORG Primitive UPDATE 2012-01
// 0 !LICENSE Licensed under CC BY 4.0 : see CAreadme.txt
// 
// 0 BFC CERTIFY CCW
  [0,"BFC","CERTIFY"],
  [0,"BFC","CCW"],
// 
// 0 !HISTORY 2002-04-04 [sbliss] Modified for BFC compliance
// 0 !HISTORY 2002-04-25 [PTadmin] Official Update 2002-02
// 0 !HISTORY 2007-06-24 [PTadmin] Header formatted for Contributor Agreement
// 0 !HISTORY 2008-07-01 [PTadmin] Official Update 2008-01
// 0 !HISTORY 2012-02-16 [Philo] Changed to CCW
// 0 !HISTORY 2012-03-30 [PTadmin] Official Update 2012-01
// 
// 
// 1 16 0 0 0 6 0 0 0 1 0 0 0 6 4-4edge.dat
  [1,16,0,0,0,6,0,0,0,1,0,0,0,6, ldraw_lib__4_4edge()],
// 1 16 0 -4 0 6 0 0 0 1 0 0 0 6 4-4edge.dat
  [1,16,0,-4,0,6,0,0,0,1,0,0,0,6, ldraw_lib__4_4edge()],
// 1 16 0 0 0 6 0 0 0 -4 0 0 0 6 4-4cyli.dat
  [1,16,0,0,0,6,0,0,0,-4,0,0,0,6, ldraw_lib__4_4cyli()],
// 1 16 0 -4 0 6 0 0 0 1 0 0 0 6 4-4disc.dat
  [1,16,0,-4,0,6,0,0,0,1,0,0,0,6, ldraw_lib__4_4disc()],
  [-1,16,0,0,0,6,0,0,0,-1,0,0,0,6, ldraw_lib__4_4disc()],
];
module ldraw_lib__stud(step=0, col=false, unit=2/5, alt=false, line=0.2, solid=!$preview)
    makepoly(ldraw_lib__stud(), step=step, col=col, unit=unit, alt=alt, line=line, solid=solid);
ldraw_lib__stud(line=0.2);
// file: s/3001s02.scad
use <../../lib.scad>
use <../../p/box4.scad>
use <../../p/box5.scad>
use <../../p/stud4.scad>
function ldraw_lib__s__3001s02() = [
// 0 ~Brick  2 x  4 without Top and Top Studs
// 0 Name: s\3001s02.dat
// 0 Author: Rene Rechthaler [Blechtaler]
// 0 !LDRAW_ORG Subpart UPDATE 2024-09
// 0 !LICENSE Licensed under CC BY 4.0 : see CAreadme.txt
// 
// 0 BFC CERTIFY CCW
  [0,"BFC","CERTIFY"],
  [0,"BFC","CCW"],
// 
// 0 !HISTORY 2023-11-20 [Blechtaler] made from 3001s01
// 0 !HISTORY 2024-10-27 [OrionP] Official Update 2024-09
// 
// 1 16 20 4 0 1 0 0 0 -5 0 0 0 1 stud4.dat
  [1,16,20,4,0,1,0,0,0,-5,0,0,0,1, ldraw_lib__stud4()],
// 1 16 0 4 0 1 0 0 0 -5 0 0 0 1 stud4.dat
  [1,16,0,4,0,1,0,0,0,-5,0,0,0,1, ldraw_lib__stud4()],
// 1 16 -20 4 0 1 0 0 0 -5 0 0 0 1 stud4.dat
  [1,16,-20,4,0,1,0,0,0,-5,0,0,0,1, ldraw_lib__stud4()],
// 0 BFC INVERTNEXT
  [0,"BFC","INVERTNEXT"],
// 1 16 0 24 0 36 0 0 0 -20 0 0 0 16 box5.dat
  [1,16,0,24,0,36,0,0,0,-20,0,0,0,16, ldraw_lib__box5()],
// 4 16 40 24 20 36 24 16 -36 24 16 -40 24 20
  [4,16,40,24,20,36,24,16,-36,24,16,-40,24,20],
// 4 16 -40 24 20 -36 24 16 -36 24 -16 -40 24 -20
  [4,16,-40,24,20,-36,24,16,-36,24,-16,-40,24,-20],
// 4 16 -40 24 -20 -36 24 -16 36 24 -16 40 24 -20
  [4,16,-40,24,-20,-36,24,-16,36,24,-16,40,24,-20],
// 4 16 40 24 -20 36 24 -16 36 24 16 40 24 20
  [4,16,40,24,-20,36,24,-16,36,24,16,40,24,20],
// 1 16 0 24 0 0 0 40 0 -24 0 -20 0 0 box4.dat
  [1,16,0,24,0,0,0,40,0,-24,0,-20,0,0, ldraw_lib__box4()],
];
module ldraw_lib__s__3001s02(step=0, col=false, unit=2/5, alt=false, line=0.2, solid=!$preview)
    makepoly(ldraw_lib__s__3001s02(), step=step, col=col, unit=unit, alt=alt, line=line, solid=solid);
ldraw_lib__s__3001s02(line=0.2);
// main file
use <../lib.scad>
use <s/3001s02.scad>
use <../p/stud.scad>
function ldraw_lib__60235p01() = [
// 0 Brick Braille 2 x 4 with 3 Studs (DOTS-235) with "+" Pattern
// 0 Name: 60235p01.dat
// 0 Author: Rene Rechthaler [Blechtaler]
// 0 !LDRAW_ORG Part UPDATE 2025-08
// 0 !LICENSE Licensed under CC BY 4.0 : see CAreadme.txt
// 
// 0 BFC CERTIFY CCW
  [0,"BFC","CERTIFY"],
  [0,"BFC","CCW"],
// 
// 0 !KEYWORDS ⠖ Unicode U+2816 (10262), addition, Bricklink 60235pb01, plus
// 0 !KEYWORDS Rebrickable 60235pr0001, Set 4000503, set 40722, set 40723
// 0 !KEYWORDS set 40724
// 
// 0 !HISTORY 2024-08-18 [MagFors] Changed orientation, added keywords
// 0 !HISTORY 2025-08-31 [OrionP] Official Update 2025-08
// 
// 1 16 0 0 0 1 0 0 0 1 0 0 0 1 s\3001s02.dat
  [1,16,0,0,0,1,0,0,0,1,0,0,0,1, ldraw_lib__s__3001s02()],
// 1 16 -10 0 -10 1 0 0 0 1 0 0 0 1 stud.dat
  [1,16,-10,0,-10,1,0,0,0,1,0,0,0,1, ldraw_lib__stud()],
// 1 16 -10 0 10 1 0 0 0 1 0 0 0 1 stud.dat
  [1,16,-10,0,10,1,0,0,0,1,0,0,0,1, ldraw_lib__stud()],
// 1 16 10 0 -10 1 0 0 0 1 0 0 0 1 stud.dat
  [1,16,10,0,-10,1,0,0,0,1,0,0,0,1, ldraw_lib__stud()],
// 
// 0 // Pattern
// 0 // Character
// 4 0 31 0 .7 31 0 -.7 33.4 0 -.7 33.4 0 .7
  [4,0,31,0,.7,31,0,-.7,33.4,0,-.7,33.4,0,.7],
// 4 0 31 0 -.7 29.6 0 -.7 29.6 0 -3.1 31 0 -3.1
  [4,0,31,0,-.7,29.6,0,-.7,29.6,0,-3.1,31,0,-3.1],
// 4 0 27.2 0 .7 27.2 0 -.7 29.6 0 -.7 29.6 0 .7
  [4,0,27.2,0,.7,27.2,0,-.7,29.6,0,-.7,29.6,0,.7],
// 4 0 29.6 0 .7 29.6 0 -.7 31 0 -.7 31 0 .7
  [4,0,29.6,0,.7,29.6,0,-.7,31,0,-.7,31,0,.7],
// 4 0 31 0 .7 31 0 3.1 29.6 0 3.1 29.6 0 .7
  [4,0,31,0,.7,31,0,3.1,29.6,0,3.1,29.6,0,.7],
// 0 // Background
// 4 16 -40 0 -20 29.6 0 -3.1 29.6 0 -.7 27.2 0 -.7
  [4,16,-40,0,-20,29.6,0,-3.1,29.6,0,-.7,27.2,0,-.7],
// 4 16 40 0 20 31 0 3.1 31 0 .7 33.4 0 .7
  [4,16,40,0,20,31,0,3.1,31,0,.7,33.4,0,.7],
// 4 16 -40 0 20 27.2 0 .7 29.6 0 .7 29.6 0 3.1
  [4,16,-40,0,20,27.2,0,.7,29.6,0,.7,29.6,0,3.1],
// 4 16 29.6 0 -3.1 -40 0 -20 40 0 -20 31 0 -3.1
  [4,16,29.6,0,-3.1,-40,0,-20,40,0,-20,31,0,-3.1],
// 4 16 31 0 -.7 31 0 -3.1 40 0 -20 33.4 0 -.7
  [4,16,31,0,-.7,31,0,-3.1,40,0,-20,33.4,0,-.7],
// 4 16 33.4 0 .7 33.4 0 -.7 40 0 -20 40 0 20
  [4,16,33.4,0,.7,33.4,0,-.7,40,0,-20,40,0,20],
// 4 16 29.6 0 3.1 31 0 3.1 40 0 20 -40 0 20
  [4,16,29.6,0,3.1,31,0,3.1,40,0,20,-40,0,20],
// 4 16 -40 0 -20 27.2 0 -.7 27.2 0 .7 -40 0 20
  [4,16,-40,0,-20,27.2,0,-.7,27.2,0,.7,-40,0,20],
];
module ldraw_lib__60235p01(step=0, col=false, unit=2/5, alt=false, line=0.2, solid=!$preview)
    makepoly(ldraw_lib__60235p01(), step=step, col=col, unit=unit, alt=alt, line=line, solid=solid);
ldraw_lib__60235p01(line=0.2);
